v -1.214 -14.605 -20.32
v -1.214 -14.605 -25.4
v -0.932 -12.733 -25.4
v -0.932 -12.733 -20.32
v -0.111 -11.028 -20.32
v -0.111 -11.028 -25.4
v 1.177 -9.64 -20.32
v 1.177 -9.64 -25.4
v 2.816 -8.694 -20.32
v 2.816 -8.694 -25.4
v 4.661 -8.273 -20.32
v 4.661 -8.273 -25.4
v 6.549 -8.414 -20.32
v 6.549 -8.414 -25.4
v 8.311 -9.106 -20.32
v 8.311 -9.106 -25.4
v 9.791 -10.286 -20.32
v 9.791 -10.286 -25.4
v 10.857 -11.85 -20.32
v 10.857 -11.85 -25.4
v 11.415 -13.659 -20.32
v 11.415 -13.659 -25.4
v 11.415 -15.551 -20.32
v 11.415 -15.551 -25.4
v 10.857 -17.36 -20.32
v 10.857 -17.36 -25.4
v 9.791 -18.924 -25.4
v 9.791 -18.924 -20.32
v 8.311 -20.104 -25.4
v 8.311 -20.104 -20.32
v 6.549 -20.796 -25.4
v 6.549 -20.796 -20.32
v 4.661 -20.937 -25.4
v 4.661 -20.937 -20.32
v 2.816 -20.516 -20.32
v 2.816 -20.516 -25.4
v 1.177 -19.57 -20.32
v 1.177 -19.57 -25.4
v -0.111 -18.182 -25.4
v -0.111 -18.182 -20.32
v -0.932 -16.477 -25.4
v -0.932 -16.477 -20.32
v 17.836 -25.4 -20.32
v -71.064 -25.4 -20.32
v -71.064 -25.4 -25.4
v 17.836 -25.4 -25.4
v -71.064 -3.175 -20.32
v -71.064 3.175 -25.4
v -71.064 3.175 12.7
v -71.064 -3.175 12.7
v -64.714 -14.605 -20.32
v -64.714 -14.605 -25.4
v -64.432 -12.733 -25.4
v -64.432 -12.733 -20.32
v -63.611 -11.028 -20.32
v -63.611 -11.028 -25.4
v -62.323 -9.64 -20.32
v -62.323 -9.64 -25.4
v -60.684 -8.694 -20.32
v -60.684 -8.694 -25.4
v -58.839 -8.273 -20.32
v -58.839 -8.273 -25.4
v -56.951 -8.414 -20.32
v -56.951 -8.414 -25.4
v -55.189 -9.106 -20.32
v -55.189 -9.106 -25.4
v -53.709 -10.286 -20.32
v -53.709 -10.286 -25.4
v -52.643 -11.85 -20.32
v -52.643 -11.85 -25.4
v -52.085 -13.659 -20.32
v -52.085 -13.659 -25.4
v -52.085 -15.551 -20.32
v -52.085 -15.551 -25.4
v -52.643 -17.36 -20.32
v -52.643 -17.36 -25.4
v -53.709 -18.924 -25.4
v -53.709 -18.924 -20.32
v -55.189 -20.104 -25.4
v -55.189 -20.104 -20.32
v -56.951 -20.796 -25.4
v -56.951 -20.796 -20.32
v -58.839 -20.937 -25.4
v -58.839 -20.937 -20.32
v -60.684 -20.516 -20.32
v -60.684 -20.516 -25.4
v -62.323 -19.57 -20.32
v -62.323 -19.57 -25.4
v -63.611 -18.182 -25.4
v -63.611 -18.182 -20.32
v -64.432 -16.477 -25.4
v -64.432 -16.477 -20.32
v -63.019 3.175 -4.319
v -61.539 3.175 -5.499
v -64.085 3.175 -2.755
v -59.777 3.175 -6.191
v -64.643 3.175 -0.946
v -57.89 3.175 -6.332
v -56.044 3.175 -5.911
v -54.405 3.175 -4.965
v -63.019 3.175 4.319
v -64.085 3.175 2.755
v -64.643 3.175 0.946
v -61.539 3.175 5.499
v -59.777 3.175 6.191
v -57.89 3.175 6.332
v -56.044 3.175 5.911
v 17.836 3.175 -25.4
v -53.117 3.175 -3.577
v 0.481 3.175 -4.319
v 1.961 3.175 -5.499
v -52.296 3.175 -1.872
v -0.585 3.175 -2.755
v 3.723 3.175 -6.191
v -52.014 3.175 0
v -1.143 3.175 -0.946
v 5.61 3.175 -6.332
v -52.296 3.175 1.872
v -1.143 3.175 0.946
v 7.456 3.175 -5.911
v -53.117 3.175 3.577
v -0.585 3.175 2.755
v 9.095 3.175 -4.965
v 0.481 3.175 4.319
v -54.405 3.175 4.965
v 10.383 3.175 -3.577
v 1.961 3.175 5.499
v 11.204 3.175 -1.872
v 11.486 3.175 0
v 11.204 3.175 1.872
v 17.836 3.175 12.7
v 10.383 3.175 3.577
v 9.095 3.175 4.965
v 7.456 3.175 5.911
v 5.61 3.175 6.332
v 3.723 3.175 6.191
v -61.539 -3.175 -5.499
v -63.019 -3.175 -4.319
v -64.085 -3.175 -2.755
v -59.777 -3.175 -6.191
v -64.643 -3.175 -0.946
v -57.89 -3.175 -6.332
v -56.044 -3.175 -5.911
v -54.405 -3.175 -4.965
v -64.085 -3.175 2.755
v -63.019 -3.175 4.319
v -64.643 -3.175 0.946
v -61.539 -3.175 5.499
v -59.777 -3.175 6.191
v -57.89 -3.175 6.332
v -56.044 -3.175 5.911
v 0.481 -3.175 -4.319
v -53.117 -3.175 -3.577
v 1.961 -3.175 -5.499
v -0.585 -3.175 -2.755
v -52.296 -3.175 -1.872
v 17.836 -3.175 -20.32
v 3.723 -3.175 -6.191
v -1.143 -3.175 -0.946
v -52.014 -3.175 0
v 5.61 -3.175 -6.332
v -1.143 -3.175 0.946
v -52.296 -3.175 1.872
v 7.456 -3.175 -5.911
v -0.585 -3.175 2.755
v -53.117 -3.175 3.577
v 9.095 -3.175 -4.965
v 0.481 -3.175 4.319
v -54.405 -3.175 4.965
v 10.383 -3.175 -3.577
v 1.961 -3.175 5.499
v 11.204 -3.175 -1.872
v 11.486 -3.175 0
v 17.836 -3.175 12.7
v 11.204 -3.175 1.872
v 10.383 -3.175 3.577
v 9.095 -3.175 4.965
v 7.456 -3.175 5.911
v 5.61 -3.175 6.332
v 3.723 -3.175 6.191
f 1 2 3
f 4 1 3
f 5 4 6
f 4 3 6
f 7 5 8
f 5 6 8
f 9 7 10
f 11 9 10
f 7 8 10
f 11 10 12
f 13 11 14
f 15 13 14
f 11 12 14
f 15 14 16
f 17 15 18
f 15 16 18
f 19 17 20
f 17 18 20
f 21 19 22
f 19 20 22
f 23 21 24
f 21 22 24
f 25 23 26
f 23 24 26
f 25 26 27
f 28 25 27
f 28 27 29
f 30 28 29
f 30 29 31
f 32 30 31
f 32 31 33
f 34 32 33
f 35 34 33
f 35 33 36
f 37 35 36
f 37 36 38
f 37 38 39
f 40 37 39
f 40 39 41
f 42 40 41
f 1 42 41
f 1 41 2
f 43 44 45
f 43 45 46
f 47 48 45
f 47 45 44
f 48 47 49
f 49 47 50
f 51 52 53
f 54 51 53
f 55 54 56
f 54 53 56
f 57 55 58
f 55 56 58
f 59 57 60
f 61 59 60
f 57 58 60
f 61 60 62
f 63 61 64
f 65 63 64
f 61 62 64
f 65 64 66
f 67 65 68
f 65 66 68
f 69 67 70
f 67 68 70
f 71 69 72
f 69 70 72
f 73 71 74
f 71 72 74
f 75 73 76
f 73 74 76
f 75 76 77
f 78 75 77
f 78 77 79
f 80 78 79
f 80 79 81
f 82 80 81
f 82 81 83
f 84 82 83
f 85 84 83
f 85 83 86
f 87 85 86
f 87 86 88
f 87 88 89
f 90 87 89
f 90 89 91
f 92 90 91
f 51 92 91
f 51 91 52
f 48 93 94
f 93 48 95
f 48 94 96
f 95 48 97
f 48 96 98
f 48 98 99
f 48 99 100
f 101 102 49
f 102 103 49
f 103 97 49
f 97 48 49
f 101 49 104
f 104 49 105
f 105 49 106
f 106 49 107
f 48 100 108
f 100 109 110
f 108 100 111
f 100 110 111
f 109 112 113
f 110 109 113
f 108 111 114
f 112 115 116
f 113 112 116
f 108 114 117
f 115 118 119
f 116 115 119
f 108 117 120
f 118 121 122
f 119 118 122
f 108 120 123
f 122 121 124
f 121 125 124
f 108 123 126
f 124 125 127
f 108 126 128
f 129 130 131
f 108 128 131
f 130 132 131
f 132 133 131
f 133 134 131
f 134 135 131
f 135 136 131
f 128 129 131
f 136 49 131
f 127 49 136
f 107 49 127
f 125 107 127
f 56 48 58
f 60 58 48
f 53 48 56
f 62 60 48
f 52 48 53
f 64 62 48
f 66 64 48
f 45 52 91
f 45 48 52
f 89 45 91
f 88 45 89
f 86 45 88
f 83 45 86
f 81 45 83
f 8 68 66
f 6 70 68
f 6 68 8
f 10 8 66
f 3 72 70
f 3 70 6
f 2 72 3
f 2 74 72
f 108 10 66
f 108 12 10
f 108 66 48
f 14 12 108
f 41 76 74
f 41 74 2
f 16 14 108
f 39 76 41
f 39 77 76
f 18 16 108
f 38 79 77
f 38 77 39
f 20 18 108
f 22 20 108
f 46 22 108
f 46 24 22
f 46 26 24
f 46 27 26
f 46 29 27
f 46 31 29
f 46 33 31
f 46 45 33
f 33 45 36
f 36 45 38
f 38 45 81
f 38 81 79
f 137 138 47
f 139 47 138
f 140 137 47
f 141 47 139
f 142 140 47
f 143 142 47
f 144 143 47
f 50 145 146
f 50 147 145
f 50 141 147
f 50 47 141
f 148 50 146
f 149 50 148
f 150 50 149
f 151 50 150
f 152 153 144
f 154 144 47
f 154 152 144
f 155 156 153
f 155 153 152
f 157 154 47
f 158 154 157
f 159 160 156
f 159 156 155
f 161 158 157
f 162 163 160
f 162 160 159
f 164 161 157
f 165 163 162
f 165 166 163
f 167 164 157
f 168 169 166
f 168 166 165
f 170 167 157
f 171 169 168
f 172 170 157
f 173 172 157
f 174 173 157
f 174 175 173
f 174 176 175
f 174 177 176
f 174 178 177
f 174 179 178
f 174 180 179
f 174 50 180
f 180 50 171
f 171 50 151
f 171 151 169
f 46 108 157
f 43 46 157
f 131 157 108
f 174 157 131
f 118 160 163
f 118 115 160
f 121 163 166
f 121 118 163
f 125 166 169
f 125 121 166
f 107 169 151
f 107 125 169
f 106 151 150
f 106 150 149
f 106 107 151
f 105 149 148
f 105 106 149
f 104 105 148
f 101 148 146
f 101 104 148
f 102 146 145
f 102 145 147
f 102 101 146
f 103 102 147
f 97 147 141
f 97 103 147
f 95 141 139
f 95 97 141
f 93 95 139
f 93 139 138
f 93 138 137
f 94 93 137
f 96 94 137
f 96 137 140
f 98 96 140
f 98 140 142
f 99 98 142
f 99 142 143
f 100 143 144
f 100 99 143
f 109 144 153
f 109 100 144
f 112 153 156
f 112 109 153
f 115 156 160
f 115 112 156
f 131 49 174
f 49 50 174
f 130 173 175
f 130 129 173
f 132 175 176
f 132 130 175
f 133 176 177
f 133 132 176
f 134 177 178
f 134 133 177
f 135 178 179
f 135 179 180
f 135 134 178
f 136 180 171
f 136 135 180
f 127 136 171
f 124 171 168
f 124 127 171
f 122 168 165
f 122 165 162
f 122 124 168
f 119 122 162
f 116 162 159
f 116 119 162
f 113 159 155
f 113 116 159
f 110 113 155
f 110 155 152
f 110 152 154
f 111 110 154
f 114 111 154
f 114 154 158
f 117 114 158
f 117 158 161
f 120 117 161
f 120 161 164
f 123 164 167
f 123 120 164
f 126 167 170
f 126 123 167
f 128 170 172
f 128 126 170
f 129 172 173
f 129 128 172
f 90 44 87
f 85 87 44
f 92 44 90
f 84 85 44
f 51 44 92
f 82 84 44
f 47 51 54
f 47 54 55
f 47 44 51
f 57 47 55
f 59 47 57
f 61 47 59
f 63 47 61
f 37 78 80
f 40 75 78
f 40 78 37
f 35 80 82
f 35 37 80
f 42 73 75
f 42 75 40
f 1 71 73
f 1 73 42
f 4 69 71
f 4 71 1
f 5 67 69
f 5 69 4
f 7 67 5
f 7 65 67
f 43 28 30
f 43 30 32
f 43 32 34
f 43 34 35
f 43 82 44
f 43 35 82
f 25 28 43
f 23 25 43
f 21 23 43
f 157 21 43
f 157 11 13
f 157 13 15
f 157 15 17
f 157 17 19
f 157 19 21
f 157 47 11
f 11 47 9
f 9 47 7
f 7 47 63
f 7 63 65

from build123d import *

# Parameters (mm, degrees)
F0_W     = 88.9
F0_H     = 33.02
F0_R     = 6.35
F1_DEPTH = 3.175
F0_H_2   = 5.08
F2_DEPTH = 25.4
F3_DEPTH = 3.175
F5_D     = 12.7


with BuildPart() as f1:
    # F0 (on Front) → F1 (new body, symmetric)
    with BuildSketch(Plane.XZ):
        with Locations((-26.614039, -3.81)):
            Rectangle(F0_W, F0_H)
        with Locations((-58.364039, 0)):
            Circle(F0_R, mode=Mode.SUBTRACT)
        with Locations((5.135961, 0)):
            Circle(F0_R, mode=Mode.SUBTRACT)
    extrude(amount=F1_DEPTH, both=True)

    # F0 (on Front) → F2 (join)
    with BuildSketch(Plane.XZ):
        with Locations((-26.614039, -22.86)):
            Rectangle(F0_W, F0_H_2)
    extrude(amount=F2_DEPTH)

    # F0 (on Front) → F3 (join)
    with BuildSketch(Plane.XZ):
        with Locations((-26.614039, -22.86)):
            Rectangle(F0_W, F0_H_2)
    extrude(amount=-F3_DEPTH)

    # F5 (through all)
    with Locations(Plane.XY):
        with Locations((-58.364039, -14.605), (5.135961, -14.605)):
            Hole(F5_D / 2)


solid = f1.part
